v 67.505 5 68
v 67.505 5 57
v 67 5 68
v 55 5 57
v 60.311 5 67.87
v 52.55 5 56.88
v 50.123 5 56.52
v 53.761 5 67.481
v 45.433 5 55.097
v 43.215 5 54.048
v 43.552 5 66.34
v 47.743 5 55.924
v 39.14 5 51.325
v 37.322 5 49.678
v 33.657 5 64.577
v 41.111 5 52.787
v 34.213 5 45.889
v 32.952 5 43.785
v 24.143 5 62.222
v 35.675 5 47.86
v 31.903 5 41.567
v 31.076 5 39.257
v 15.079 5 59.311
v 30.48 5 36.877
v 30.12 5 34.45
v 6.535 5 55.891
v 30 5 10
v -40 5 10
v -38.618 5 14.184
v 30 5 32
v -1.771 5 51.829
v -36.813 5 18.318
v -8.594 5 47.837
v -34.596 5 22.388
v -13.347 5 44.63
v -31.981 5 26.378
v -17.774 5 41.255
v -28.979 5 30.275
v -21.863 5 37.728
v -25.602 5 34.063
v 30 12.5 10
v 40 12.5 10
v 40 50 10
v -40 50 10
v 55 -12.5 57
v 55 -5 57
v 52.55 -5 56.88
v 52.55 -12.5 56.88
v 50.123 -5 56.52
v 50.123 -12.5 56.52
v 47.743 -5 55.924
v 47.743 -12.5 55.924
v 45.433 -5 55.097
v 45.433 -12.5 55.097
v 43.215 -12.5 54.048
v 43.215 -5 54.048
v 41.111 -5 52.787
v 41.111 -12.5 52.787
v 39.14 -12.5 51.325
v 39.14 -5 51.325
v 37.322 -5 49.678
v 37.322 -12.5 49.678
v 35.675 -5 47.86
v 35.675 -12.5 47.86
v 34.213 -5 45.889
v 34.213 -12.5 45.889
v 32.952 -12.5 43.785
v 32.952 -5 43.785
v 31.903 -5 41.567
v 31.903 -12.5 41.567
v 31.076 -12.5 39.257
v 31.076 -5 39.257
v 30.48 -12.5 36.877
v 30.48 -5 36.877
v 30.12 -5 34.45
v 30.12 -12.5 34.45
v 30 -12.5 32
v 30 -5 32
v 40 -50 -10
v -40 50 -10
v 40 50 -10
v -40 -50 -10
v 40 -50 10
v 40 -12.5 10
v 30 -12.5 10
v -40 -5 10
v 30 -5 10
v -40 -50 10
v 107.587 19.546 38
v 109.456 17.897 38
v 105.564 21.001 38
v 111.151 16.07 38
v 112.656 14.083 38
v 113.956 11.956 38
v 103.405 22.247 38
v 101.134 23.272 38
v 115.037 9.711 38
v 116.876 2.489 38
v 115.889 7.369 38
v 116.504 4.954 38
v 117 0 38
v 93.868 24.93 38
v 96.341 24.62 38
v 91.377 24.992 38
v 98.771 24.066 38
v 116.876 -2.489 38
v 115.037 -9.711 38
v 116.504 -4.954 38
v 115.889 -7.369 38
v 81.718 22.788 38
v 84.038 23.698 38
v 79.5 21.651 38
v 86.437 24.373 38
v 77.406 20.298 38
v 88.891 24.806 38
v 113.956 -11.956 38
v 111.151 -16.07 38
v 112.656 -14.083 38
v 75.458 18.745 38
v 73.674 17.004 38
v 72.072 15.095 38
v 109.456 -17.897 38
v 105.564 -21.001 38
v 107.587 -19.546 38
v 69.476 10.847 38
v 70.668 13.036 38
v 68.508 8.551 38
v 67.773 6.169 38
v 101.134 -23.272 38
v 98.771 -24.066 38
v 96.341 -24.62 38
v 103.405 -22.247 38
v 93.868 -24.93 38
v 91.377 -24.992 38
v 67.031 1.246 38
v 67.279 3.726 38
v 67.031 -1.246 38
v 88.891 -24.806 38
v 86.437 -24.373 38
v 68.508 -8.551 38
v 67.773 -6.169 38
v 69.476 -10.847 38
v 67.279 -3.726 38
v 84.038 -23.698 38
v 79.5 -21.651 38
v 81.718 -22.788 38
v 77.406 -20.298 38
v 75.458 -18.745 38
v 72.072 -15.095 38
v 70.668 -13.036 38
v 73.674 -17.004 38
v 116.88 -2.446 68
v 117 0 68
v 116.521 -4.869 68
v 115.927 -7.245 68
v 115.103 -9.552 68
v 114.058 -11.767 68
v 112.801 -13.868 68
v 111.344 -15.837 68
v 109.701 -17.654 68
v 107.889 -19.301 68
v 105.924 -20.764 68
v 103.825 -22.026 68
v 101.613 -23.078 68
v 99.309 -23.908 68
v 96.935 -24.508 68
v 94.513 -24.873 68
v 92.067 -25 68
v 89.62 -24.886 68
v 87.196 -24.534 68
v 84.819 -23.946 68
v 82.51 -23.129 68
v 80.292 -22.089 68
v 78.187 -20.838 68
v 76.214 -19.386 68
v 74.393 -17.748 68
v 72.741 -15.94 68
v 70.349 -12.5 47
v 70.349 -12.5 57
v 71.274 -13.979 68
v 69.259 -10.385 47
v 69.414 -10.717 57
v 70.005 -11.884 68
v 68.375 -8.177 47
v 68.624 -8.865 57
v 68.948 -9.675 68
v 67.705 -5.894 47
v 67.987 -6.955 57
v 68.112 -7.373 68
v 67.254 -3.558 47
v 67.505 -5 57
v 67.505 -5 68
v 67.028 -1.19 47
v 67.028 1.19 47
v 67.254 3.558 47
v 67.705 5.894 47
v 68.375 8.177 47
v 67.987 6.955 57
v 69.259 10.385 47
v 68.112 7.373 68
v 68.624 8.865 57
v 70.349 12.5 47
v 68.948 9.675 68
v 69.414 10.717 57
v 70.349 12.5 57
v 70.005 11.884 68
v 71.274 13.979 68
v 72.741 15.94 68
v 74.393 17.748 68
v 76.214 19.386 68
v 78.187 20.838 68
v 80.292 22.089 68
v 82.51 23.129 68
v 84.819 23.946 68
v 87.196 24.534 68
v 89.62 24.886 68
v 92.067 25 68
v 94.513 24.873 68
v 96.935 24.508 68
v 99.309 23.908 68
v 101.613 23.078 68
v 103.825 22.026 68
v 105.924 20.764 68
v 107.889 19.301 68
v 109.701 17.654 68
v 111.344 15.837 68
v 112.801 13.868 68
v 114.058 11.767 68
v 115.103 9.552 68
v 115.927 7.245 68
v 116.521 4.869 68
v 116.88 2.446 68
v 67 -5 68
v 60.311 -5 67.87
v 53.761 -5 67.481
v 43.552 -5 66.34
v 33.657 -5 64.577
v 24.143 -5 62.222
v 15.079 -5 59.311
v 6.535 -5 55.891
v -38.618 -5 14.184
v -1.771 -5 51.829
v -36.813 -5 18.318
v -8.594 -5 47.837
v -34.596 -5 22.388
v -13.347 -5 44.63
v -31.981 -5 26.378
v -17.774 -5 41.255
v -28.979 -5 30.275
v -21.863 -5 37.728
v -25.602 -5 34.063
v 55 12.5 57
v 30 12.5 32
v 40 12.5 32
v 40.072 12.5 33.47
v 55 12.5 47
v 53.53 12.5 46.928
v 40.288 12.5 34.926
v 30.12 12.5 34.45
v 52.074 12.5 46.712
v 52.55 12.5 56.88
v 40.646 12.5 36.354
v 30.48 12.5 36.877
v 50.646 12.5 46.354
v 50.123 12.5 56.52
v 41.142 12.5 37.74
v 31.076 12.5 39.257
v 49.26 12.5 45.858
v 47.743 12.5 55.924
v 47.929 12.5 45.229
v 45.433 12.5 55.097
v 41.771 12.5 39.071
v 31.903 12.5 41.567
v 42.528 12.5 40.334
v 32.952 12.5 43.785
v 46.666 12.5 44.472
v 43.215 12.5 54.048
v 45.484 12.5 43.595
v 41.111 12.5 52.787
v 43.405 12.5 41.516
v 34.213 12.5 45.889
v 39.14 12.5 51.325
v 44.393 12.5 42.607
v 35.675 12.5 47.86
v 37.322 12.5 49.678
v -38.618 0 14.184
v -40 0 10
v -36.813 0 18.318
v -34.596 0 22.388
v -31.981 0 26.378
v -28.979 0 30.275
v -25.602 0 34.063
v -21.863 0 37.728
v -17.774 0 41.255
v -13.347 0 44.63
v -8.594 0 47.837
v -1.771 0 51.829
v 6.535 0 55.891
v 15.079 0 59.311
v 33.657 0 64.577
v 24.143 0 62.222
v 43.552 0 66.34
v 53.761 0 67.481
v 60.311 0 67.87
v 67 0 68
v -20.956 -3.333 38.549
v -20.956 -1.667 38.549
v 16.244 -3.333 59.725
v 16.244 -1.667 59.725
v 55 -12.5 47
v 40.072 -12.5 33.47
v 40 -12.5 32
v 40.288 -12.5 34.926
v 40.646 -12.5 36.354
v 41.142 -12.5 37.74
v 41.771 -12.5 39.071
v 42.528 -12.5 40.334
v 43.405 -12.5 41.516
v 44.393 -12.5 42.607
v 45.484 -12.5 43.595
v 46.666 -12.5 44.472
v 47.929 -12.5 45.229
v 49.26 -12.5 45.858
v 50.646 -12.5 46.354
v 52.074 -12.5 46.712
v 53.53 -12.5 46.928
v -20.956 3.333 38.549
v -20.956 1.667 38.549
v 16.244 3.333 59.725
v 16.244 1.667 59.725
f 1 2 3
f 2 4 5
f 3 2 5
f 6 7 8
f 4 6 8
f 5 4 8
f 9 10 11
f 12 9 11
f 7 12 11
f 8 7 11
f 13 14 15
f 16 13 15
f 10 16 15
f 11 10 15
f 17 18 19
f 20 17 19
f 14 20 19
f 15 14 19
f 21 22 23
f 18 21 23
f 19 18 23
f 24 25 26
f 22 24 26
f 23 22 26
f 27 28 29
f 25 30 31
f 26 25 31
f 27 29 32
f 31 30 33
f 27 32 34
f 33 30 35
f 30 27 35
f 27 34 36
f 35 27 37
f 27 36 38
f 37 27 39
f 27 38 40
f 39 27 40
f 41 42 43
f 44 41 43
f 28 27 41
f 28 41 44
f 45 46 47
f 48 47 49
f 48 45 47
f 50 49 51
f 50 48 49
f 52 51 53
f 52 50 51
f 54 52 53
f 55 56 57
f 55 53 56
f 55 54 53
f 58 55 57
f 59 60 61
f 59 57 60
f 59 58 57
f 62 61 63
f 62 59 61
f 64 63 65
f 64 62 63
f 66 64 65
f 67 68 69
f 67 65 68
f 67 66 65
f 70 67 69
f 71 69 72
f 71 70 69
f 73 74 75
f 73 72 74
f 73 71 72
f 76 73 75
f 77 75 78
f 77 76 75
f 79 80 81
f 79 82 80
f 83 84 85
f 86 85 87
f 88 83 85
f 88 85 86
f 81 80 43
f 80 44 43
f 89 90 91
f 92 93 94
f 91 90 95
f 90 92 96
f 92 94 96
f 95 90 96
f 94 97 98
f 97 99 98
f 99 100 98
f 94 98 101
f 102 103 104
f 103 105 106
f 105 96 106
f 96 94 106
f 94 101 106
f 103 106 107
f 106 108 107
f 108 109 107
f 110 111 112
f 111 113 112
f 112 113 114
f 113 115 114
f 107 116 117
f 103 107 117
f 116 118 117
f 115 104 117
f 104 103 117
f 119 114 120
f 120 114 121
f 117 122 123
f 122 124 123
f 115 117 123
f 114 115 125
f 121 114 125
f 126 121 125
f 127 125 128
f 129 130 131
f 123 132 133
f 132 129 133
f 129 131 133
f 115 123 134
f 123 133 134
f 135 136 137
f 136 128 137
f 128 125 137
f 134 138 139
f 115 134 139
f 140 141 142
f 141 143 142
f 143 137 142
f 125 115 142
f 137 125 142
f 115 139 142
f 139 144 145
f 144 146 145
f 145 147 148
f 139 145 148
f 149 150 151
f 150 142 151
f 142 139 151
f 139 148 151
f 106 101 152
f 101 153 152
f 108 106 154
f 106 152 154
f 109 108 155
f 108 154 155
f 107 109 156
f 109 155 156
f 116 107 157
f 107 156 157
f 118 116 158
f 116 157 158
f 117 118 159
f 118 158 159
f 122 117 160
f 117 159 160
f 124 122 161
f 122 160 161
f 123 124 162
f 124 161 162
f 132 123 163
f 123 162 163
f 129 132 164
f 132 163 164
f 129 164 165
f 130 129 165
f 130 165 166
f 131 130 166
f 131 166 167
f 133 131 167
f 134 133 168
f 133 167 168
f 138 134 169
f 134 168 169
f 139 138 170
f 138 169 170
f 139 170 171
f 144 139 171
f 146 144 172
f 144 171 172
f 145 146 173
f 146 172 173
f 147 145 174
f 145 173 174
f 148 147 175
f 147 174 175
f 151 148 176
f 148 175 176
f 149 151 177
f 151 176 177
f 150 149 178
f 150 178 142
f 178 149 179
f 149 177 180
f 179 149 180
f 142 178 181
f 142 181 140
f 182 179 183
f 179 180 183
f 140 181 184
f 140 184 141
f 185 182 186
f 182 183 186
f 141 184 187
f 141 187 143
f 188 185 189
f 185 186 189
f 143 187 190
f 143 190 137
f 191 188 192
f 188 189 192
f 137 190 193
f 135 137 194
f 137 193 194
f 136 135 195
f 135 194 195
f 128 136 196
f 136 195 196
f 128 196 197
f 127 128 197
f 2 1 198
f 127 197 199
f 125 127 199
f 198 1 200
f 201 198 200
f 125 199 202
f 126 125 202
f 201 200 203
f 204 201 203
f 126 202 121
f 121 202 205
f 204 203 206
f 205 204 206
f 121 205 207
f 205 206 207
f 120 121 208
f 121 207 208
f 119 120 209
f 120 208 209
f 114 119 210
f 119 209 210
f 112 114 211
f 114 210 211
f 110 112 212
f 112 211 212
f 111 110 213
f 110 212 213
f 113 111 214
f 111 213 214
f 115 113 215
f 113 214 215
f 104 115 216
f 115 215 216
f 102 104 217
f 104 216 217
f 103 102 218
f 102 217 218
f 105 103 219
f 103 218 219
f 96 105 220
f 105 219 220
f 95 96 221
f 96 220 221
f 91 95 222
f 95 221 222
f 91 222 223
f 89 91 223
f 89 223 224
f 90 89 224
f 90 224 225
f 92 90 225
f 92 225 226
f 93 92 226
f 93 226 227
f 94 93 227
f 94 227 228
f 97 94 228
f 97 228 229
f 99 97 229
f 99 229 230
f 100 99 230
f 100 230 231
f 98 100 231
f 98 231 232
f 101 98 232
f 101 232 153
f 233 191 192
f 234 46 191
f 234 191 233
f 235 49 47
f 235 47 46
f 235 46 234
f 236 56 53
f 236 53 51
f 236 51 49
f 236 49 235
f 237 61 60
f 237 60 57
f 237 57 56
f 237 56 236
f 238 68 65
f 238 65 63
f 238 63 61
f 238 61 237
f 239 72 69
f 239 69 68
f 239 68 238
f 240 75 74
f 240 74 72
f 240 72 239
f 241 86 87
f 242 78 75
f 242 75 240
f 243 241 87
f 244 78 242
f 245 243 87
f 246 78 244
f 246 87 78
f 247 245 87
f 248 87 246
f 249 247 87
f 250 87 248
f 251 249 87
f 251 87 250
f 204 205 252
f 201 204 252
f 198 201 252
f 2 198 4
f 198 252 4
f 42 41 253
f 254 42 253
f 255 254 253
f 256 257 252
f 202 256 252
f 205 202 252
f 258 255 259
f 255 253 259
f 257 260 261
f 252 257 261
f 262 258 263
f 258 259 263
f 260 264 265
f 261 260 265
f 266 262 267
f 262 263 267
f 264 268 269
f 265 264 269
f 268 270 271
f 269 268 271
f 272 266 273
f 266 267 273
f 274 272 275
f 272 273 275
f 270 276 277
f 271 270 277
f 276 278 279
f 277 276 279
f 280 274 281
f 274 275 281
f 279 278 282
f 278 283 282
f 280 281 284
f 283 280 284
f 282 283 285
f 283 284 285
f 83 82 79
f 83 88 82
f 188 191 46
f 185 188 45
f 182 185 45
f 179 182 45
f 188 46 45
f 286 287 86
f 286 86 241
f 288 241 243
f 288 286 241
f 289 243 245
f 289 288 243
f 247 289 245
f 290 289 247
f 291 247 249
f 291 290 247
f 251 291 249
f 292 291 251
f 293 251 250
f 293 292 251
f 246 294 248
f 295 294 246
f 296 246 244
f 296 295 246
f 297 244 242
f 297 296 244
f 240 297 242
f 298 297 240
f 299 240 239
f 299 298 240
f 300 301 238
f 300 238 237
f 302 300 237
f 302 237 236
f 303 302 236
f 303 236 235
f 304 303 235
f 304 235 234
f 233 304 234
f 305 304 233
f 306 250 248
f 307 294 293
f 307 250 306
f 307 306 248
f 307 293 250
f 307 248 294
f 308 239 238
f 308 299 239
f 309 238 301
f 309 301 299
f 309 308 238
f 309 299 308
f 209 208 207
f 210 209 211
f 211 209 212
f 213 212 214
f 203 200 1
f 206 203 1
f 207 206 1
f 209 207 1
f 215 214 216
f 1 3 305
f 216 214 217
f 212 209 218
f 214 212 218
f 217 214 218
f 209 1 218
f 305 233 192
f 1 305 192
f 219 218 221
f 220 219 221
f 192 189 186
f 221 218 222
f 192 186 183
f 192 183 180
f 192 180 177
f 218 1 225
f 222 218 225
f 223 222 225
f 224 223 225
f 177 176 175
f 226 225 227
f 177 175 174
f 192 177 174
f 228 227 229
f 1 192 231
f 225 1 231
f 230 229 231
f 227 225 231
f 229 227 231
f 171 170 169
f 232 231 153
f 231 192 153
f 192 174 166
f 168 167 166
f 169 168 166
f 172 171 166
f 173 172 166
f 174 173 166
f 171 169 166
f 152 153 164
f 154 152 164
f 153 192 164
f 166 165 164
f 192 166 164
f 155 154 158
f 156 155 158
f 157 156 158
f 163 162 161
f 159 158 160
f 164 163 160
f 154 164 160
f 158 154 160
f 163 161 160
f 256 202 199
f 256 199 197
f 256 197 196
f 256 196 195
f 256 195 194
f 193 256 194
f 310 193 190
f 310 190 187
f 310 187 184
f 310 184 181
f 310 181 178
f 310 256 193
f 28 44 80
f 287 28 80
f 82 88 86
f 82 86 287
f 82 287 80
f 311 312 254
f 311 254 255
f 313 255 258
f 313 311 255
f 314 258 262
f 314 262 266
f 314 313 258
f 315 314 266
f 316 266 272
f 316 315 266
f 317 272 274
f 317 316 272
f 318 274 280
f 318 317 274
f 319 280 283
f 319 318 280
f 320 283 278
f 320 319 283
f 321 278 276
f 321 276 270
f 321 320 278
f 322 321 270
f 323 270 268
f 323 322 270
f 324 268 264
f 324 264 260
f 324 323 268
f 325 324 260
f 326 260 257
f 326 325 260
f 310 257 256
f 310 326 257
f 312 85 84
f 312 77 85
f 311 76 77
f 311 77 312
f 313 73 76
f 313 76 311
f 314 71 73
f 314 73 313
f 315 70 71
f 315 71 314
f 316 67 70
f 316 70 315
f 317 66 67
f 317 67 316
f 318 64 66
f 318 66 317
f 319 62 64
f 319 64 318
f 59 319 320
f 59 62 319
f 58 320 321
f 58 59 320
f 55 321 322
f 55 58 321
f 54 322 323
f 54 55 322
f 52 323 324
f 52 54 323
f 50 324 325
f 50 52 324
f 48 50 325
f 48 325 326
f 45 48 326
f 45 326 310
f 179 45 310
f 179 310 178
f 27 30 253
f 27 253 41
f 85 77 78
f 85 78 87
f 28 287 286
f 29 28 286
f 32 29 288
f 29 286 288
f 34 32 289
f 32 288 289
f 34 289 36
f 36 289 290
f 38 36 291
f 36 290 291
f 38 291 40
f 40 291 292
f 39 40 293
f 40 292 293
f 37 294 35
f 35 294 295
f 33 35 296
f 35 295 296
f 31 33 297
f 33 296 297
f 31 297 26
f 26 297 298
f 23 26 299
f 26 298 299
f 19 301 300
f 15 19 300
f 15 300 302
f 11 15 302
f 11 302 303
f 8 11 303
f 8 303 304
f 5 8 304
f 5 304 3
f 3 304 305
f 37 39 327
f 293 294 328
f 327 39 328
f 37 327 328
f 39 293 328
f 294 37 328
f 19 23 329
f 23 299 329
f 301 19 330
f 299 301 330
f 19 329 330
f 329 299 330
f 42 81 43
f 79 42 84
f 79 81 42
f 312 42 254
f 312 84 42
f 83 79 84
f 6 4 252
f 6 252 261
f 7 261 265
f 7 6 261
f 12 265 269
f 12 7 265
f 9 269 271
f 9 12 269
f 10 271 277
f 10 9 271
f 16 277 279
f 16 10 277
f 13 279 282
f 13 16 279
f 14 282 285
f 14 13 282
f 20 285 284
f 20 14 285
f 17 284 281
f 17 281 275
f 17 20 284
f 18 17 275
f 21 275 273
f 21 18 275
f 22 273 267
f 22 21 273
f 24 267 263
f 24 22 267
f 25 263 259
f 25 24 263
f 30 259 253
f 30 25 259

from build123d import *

# Parameters (mm, degrees)
F1_DEPTH = 50
F2_DEPTH = 12.5
F3_DEPTH = 5
F5_DEPTH = 5


with BuildPart() as f1:
    # F0 (on Front) → F1 (new body, symmetric)
    with BuildSketch(Plane.XZ):
        Polygon((-40, -10), (40, -10), (40, 10), (30, 10), (-40, 10), align=None)
    extrude(amount=F1_DEPTH, both=True)

    # F0 (on Front) → F2 (join, symmetric)
    with BuildSketch(Plane.XZ):
        with BuildLine():
            Line((30, 10), (40, 10))
            Line((40, 10), (40, 32))
            ThreePointArc((40, 32), (44.3933982822, 42.6066017178), (55, 47))
            Line((55, 47), (67, 47))
            Line((67, 47), (67, 57))
            Line((67, 57), (55, 57))
            ThreePointArc((55, 57), (37.3223304703, 49.6776695297), (30, 32))
            Line((30, 32), (30, 10))
        make_face()
    extrude(amount=F2_DEPTH, both=True)

    # F0 (on Front) → F3 (join, symmetric)
    with BuildSketch(Plane.XZ):
        with BuildLine():
            add(Edge.make_bspline(
                [(-40, 10), (-31.567607969, 40.394651228), (11, 68.0161871854), (67, 68)],
                knots=[0, 0, 0, 0, 121.7086685491, 121.7086685491, 121.7086685491, 121.7086685491], degree=3))
            Line((-40, 10), (30, 10))
            Line((30, 10), (30, 32))
            ThreePointArc((30, 32), (37.3223304703, 49.6776695297), (55, 57))
            Line((55, 57), (67, 57))
            Line((67, 57), (67, 68))
        make_face()
    extrude(amount=F3_DEPTH, both=True)

    # F0 (on Front) → F4 (revolve)
    with BuildSketch(Plane.XZ):
        Polygon((117, 68), (92, 68), (92, 57), (92, 47), (92, 38), (117, 38), align=None)
    revolve(axis=Axis((92, 0, 52), (0, 0, -1)))

    # F5 (add): faces of the model
    f5_faces = [f1.faces().sort_by_distance(p)[0] for p in [
        (67, 5.1041666667, 55.2083333333),
        (67, -5.1041666667, 55.2083333333),
    ]]
    extrude(f5_faces, amount=F5_DEPTH)


solid = f1.part
